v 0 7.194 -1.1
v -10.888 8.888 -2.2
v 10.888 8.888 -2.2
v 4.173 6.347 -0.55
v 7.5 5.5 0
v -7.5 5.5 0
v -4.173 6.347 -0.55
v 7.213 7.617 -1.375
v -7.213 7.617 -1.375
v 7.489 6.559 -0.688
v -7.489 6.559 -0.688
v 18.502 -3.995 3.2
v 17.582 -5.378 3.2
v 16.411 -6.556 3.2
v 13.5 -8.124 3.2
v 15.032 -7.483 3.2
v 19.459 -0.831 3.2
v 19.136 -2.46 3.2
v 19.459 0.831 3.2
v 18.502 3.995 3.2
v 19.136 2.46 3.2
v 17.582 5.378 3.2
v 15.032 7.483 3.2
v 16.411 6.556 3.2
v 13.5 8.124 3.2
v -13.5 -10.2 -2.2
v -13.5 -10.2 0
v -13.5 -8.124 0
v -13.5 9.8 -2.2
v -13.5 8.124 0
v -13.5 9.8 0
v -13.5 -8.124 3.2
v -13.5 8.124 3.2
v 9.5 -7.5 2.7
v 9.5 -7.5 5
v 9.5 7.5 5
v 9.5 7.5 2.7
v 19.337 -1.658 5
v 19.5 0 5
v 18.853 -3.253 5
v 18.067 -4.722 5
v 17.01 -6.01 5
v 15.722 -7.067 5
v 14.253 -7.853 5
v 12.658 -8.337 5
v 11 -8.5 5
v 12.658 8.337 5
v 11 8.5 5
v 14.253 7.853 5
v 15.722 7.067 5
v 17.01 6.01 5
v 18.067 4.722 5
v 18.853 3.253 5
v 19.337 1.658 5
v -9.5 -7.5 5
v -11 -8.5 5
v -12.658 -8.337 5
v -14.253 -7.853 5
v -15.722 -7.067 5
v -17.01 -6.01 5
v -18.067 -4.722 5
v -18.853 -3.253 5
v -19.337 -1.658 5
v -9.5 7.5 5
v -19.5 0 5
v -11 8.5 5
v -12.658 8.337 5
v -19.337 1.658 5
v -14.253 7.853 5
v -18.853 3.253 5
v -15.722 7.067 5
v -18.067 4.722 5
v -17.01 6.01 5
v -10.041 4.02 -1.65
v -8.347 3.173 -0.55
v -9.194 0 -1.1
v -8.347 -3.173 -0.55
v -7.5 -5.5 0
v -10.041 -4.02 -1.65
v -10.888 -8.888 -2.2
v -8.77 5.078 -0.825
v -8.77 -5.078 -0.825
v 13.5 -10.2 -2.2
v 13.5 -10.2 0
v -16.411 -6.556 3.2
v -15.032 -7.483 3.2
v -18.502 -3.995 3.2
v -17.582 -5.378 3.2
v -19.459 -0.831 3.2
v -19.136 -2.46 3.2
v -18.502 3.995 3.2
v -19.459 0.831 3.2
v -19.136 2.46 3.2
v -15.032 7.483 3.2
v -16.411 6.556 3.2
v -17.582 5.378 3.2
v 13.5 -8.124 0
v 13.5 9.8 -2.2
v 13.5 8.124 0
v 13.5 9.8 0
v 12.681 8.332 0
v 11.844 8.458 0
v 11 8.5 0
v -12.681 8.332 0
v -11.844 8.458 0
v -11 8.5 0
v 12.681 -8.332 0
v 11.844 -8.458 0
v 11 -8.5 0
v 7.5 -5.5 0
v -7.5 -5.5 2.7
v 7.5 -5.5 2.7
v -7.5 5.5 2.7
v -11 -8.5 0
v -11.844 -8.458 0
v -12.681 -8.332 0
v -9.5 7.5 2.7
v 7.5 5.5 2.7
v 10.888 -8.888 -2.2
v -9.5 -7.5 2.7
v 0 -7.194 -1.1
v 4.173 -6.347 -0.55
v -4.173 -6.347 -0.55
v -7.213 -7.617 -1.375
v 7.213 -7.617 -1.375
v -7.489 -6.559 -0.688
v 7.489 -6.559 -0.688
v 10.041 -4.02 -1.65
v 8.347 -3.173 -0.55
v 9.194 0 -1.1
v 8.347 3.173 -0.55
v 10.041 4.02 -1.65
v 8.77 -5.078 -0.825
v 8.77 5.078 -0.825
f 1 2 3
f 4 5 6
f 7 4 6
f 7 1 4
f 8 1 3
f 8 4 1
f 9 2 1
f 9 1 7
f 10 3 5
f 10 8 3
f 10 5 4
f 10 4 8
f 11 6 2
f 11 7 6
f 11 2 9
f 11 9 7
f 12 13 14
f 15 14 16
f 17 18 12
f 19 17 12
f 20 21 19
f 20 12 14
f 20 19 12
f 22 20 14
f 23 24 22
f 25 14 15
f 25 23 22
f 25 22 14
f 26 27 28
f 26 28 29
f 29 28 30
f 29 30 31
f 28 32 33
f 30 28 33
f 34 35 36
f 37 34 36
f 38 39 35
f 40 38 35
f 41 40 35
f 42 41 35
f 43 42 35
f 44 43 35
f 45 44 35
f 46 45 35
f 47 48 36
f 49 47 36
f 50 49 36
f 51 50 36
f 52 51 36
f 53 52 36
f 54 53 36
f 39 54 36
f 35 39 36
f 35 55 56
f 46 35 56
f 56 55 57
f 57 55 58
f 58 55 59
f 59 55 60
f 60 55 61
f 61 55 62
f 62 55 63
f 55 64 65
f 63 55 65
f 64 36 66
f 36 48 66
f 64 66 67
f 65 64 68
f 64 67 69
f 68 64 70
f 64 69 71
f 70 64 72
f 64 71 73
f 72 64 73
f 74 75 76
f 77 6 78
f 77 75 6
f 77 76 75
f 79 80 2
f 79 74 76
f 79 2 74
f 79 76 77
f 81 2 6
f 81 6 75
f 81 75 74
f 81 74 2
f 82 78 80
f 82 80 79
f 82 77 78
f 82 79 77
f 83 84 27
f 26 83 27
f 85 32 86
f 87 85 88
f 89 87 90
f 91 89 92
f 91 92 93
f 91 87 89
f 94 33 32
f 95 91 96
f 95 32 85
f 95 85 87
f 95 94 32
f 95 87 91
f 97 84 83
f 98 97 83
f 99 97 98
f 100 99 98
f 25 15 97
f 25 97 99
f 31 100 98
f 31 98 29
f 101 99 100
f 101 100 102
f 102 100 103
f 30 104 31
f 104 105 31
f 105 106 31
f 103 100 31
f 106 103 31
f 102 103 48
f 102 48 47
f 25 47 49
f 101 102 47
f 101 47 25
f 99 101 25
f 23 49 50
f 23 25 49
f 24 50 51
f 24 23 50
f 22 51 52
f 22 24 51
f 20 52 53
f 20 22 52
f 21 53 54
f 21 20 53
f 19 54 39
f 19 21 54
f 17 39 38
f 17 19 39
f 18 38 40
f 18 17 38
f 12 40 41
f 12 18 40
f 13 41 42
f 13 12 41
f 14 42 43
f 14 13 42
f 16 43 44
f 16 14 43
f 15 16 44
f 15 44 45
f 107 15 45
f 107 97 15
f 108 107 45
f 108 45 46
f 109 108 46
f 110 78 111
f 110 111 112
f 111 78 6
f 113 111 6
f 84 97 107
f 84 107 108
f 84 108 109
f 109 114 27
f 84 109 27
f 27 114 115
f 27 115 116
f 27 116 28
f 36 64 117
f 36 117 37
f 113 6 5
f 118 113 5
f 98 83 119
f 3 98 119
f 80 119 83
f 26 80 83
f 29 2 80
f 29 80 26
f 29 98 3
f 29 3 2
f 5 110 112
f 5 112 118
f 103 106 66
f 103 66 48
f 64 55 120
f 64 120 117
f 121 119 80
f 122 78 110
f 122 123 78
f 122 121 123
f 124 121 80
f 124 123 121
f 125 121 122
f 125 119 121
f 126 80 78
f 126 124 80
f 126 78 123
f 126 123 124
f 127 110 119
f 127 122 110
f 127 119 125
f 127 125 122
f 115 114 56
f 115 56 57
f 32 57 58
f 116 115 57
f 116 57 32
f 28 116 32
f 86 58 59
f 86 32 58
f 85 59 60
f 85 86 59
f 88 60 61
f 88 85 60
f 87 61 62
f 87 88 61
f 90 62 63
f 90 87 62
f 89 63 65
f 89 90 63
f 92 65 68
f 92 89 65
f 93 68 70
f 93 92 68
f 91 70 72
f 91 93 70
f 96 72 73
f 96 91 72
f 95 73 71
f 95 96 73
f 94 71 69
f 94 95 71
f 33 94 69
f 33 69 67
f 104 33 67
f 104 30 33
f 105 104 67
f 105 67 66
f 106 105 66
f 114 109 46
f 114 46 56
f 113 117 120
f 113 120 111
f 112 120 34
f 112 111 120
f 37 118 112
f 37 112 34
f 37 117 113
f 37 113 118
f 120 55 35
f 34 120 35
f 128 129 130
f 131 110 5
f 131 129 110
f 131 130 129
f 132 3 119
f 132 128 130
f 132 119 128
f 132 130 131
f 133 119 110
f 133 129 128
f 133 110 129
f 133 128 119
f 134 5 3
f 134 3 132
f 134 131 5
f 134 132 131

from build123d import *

# Parameters (mm, degrees)
SKETCH_1_W           = 15
SKETCH_1_H           = 11
EXTRUDE_1_DEPTH      = 5
SKETCH_2_W           = 19
SKETCH_2_H           = 15
CUT_EXTRUDE_1_DEPTH  = 2.3
SKETCH_3_OUTSIDE_W   = 49.568
SKETCH_3_OUTSIDE_H   = 27.568
SKETCH_3_OUTSIDE_W_2 = 27
SKETCH_3_OUTSIDE_H_2 = 17
CUT_EXTRUDE_2_DEPTH  = 3.2
SKETCH_4_W           = 27
SKETCH_4_H           = 20
EXTRUDE_2_DEPTH      = 2.2
SKETCH_5_W           = 15
SKETCH_5_H           = 11
CUT_EXTRUDE_3_DEPTH  = 3.2
CUT_EXTRUDE_3_TAPER  = -57


with BuildPart() as part:
    # Эскиз1 → Бобышка-Вытянуть1 (new body)
    with BuildSketch(Plane.XY):
        with BuildLine():
            Line((-11, 8.5), (11, 8.5))
            ThreePointArc((11, 8.5), (19.5, 0), (11, -8.5))
            Line((11, -8.5), (-11, -8.5))
            ThreePointArc((-11, -8.5), (-19.5, 0), (-11, 8.5))
        make_face()
        Rectangle(SKETCH_1_W, SKETCH_1_H, mode=Mode.SUBTRACT)
    extrude(amount=EXTRUDE_1_DEPTH)

    # Эскиз2 → Вырез-Вытянуть1 (cut)
    with BuildSketch(Plane.XY.offset(5)):
        Rectangle(SKETCH_2_W, SKETCH_2_H)
    extrude(amount=-CUT_EXTRUDE_1_DEPTH, mode=Mode.SUBTRACT)

    # Эскиз3 outside → Вырез-Вытянуть2 (cut)
    with BuildSketch(Plane(origin=(0, 0, 0), x_dir=(-1, 0, 0), z_dir=(0, 0, -1))):
        Rectangle(SKETCH_3_OUTSIDE_W, SKETCH_3_OUTSIDE_H)
        Rectangle(SKETCH_3_OUTSIDE_W_2, SKETCH_3_OUTSIDE_H_2, mode=Mode.SUBTRACT)
    extrude(amount=-CUT_EXTRUDE_2_DEPTH, mode=Mode.SUBTRACT)

    # Эскиз4 → Бобышка-Вытянуть2 (add)
    with BuildSketch(Plane(origin=(0, 0, 0), x_dir=(-1, 0, 0), z_dir=(0, 0, -1))):
        with Locations((0, -0.2)):
            Rectangle(SKETCH_4_W, SKETCH_4_H)
    extrude(amount=EXTRUDE_2_DEPTH)

    # Эскиз5 → Вырез-Вытянуть3 (cut, through all)
    with BuildSketch(Plane.XY):
        Rectangle(SKETCH_5_W, SKETCH_5_H)
    extrude(amount=-CUT_EXTRUDE_3_DEPTH, taper=CUT_EXTRUDE_3_TAPER, mode=Mode.SUBTRACT)


solid = part.part
